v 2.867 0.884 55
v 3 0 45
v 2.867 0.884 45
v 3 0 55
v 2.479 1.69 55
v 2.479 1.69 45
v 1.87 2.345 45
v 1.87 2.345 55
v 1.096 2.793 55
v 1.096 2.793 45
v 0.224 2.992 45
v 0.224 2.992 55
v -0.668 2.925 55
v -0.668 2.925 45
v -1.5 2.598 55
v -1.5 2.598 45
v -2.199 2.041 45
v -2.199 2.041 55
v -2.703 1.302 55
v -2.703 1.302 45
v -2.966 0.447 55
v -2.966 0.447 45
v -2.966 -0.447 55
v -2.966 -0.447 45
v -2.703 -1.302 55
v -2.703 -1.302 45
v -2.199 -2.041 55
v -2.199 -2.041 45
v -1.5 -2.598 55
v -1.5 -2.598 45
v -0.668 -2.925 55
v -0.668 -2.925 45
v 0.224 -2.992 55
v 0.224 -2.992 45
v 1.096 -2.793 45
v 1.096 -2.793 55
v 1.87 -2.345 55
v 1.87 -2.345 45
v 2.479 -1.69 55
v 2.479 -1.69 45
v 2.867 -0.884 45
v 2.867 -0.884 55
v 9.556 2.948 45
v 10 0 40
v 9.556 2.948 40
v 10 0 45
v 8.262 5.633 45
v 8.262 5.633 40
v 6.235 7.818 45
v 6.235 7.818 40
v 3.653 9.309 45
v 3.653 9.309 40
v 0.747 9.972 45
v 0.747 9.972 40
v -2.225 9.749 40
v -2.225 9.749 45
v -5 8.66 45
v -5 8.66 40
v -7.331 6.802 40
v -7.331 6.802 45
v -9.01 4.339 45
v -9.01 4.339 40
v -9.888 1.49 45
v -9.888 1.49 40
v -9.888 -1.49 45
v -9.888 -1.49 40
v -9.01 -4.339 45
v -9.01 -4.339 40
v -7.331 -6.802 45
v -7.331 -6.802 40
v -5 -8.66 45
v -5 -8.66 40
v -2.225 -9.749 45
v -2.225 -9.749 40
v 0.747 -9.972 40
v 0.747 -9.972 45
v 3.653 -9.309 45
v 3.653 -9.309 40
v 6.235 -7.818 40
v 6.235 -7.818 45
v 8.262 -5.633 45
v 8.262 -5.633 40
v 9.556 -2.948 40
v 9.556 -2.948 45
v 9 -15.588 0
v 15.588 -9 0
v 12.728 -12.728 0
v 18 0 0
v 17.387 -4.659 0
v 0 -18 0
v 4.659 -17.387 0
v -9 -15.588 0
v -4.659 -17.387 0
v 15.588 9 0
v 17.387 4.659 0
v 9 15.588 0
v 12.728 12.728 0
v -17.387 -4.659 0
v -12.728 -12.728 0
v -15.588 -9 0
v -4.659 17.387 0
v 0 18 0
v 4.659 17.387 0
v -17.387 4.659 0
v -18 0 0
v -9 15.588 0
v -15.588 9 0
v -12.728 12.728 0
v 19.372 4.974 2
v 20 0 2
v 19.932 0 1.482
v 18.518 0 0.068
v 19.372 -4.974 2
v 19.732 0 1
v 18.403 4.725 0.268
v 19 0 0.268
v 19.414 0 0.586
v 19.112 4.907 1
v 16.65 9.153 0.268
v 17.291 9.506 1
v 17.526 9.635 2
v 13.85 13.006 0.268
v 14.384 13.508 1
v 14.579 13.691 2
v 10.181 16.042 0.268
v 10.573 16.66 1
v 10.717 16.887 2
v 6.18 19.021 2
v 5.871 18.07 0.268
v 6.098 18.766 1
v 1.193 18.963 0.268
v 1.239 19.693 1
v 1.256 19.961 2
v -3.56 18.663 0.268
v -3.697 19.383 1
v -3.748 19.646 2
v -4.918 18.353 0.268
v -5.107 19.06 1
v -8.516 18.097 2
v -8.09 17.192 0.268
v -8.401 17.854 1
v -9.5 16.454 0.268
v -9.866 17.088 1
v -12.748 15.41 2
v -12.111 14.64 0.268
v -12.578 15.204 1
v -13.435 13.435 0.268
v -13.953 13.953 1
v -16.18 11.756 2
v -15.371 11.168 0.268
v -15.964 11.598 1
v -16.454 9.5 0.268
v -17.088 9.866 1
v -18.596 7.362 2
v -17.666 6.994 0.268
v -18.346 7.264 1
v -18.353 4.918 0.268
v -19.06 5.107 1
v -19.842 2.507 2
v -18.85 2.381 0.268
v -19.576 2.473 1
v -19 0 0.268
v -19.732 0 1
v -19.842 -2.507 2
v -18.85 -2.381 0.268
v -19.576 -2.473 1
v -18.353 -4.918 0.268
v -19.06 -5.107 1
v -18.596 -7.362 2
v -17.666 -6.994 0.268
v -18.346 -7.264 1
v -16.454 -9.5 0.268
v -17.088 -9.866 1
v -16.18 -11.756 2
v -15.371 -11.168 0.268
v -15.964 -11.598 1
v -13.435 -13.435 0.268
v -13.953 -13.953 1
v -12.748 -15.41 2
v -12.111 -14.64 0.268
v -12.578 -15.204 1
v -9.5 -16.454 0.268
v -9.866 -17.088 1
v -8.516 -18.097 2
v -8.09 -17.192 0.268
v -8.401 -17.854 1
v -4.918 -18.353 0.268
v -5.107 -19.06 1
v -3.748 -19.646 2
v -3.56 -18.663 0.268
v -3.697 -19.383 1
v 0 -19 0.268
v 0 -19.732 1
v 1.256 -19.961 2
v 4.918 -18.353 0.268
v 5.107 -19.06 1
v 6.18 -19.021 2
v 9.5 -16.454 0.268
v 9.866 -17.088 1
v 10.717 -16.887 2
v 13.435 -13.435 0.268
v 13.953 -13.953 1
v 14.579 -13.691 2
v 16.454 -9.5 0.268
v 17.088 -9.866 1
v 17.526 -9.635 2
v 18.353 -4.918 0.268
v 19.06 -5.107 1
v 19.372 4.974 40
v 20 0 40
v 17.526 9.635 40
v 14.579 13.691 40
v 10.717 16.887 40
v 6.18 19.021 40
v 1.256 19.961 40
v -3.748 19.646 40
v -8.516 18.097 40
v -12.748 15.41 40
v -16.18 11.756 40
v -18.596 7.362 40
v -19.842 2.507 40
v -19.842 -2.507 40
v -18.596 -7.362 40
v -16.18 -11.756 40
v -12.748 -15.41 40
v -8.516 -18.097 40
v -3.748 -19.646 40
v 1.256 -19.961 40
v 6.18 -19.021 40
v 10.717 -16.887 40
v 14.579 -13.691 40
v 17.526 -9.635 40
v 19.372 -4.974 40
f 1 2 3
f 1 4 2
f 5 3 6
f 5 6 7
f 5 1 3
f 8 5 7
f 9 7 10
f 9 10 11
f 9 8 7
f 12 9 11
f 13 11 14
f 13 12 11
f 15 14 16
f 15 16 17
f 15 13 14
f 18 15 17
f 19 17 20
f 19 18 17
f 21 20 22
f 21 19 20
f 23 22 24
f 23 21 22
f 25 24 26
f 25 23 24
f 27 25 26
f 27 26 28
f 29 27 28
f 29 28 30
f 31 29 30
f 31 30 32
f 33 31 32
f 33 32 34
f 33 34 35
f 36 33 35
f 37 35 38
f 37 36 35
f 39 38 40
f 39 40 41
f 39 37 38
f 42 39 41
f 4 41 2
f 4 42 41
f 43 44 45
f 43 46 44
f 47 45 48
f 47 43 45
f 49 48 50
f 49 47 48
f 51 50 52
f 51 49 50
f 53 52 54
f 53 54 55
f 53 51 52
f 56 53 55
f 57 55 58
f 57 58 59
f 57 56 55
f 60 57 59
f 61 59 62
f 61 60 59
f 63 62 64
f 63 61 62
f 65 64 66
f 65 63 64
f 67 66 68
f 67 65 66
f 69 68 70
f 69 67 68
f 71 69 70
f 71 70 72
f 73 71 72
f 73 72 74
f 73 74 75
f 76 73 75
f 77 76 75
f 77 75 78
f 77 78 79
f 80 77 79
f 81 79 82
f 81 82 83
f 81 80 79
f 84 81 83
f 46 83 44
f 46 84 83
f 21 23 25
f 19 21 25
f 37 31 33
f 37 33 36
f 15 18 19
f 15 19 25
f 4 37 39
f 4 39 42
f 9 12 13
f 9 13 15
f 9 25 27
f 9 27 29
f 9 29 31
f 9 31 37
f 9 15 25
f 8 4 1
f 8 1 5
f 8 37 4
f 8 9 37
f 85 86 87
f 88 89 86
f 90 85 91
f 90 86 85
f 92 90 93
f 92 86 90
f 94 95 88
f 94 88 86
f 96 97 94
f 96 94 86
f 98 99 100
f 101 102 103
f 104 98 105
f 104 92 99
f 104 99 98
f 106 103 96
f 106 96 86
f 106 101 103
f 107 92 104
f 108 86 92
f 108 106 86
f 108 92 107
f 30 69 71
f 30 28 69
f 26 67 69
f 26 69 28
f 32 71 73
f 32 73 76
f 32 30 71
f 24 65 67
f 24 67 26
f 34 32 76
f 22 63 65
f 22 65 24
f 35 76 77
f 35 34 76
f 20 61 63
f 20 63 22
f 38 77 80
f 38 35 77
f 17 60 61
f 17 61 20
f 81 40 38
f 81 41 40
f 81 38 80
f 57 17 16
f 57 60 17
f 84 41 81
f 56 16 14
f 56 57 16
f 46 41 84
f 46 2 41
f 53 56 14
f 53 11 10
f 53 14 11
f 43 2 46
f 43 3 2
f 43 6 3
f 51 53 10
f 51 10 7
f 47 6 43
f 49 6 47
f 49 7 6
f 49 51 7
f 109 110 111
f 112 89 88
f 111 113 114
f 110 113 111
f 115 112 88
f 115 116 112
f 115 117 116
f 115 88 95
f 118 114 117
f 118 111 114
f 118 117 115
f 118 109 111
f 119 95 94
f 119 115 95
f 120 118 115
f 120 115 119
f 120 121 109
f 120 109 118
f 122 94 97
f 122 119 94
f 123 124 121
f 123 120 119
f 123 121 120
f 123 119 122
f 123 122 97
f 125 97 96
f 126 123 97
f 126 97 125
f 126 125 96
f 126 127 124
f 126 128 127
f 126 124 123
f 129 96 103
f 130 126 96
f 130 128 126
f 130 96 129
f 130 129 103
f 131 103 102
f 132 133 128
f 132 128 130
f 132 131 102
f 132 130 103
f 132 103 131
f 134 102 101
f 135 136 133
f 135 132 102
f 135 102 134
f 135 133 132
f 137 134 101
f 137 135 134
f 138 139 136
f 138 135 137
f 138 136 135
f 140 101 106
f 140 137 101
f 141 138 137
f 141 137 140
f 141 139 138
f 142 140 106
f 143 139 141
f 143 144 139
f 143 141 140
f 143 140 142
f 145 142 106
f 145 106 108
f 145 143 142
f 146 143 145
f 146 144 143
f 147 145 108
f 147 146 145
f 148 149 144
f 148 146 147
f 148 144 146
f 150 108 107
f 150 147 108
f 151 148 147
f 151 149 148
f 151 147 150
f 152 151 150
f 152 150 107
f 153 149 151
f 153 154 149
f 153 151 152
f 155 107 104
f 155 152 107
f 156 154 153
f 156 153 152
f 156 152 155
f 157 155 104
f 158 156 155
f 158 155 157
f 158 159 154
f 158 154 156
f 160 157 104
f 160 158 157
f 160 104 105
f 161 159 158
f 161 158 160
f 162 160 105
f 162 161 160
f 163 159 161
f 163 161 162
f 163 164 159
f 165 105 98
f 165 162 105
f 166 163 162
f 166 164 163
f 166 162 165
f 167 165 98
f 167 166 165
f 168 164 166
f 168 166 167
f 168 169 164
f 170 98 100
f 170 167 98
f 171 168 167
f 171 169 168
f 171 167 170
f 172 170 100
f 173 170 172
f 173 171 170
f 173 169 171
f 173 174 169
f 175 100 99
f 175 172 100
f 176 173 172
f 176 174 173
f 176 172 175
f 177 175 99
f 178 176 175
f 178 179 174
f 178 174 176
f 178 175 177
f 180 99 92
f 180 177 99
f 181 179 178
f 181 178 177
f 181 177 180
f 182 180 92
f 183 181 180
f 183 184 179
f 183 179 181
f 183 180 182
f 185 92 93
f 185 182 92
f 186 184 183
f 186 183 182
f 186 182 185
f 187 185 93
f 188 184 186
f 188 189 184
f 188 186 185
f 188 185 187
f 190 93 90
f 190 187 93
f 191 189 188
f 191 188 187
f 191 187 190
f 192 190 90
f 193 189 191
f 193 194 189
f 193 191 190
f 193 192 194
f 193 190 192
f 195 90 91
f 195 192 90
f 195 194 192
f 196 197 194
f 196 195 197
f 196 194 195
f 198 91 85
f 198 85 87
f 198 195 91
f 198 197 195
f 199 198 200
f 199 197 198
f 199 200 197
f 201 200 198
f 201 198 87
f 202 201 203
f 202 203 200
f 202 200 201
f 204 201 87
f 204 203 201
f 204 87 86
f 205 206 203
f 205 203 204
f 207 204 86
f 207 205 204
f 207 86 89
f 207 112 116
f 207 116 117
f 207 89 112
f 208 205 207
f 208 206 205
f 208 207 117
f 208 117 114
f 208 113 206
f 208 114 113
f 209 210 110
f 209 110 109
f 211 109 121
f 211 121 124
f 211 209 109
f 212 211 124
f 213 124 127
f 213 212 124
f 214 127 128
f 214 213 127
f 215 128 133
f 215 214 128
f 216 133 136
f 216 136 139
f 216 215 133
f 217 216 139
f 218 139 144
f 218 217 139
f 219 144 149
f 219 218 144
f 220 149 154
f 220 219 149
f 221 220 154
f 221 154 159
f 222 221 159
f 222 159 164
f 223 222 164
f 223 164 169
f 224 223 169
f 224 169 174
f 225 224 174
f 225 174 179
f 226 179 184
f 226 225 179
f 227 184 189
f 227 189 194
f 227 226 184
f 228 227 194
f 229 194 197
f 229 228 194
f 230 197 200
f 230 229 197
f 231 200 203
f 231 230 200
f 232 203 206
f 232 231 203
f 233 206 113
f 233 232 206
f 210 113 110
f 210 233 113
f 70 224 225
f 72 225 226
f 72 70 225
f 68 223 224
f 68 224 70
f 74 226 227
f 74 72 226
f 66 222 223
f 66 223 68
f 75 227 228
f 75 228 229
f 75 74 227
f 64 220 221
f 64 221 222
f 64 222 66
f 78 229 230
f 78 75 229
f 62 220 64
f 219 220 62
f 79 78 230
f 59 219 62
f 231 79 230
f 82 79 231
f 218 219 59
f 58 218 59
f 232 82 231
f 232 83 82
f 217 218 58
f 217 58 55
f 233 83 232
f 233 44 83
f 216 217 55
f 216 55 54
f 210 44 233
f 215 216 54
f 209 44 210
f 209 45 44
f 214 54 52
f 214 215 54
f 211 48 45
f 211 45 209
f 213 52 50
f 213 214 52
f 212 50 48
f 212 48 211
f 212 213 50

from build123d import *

# Parameters (mm, degrees)
FILLET_R = 2


with BuildPart() as part:
    # Sketch → Revolution (revolve)
    with BuildSketch(Plane.XZ):
        Polygon((0, 0), (20, 0), (20, 40), (10, 40), (10, 45), (3, 45), (3, 55), (0, 55), align=None)
    revolve(axis=Axis((0, 0, 0), (0, 0, 1)))

    # Fillet
    fillet_edges = [part.edges().sort_by_distance(p)[0] for p in [
        (-20, 0, 0),
    ]]
    fillet(fillet_edges, radius=FILLET_R)


solid = part.part
